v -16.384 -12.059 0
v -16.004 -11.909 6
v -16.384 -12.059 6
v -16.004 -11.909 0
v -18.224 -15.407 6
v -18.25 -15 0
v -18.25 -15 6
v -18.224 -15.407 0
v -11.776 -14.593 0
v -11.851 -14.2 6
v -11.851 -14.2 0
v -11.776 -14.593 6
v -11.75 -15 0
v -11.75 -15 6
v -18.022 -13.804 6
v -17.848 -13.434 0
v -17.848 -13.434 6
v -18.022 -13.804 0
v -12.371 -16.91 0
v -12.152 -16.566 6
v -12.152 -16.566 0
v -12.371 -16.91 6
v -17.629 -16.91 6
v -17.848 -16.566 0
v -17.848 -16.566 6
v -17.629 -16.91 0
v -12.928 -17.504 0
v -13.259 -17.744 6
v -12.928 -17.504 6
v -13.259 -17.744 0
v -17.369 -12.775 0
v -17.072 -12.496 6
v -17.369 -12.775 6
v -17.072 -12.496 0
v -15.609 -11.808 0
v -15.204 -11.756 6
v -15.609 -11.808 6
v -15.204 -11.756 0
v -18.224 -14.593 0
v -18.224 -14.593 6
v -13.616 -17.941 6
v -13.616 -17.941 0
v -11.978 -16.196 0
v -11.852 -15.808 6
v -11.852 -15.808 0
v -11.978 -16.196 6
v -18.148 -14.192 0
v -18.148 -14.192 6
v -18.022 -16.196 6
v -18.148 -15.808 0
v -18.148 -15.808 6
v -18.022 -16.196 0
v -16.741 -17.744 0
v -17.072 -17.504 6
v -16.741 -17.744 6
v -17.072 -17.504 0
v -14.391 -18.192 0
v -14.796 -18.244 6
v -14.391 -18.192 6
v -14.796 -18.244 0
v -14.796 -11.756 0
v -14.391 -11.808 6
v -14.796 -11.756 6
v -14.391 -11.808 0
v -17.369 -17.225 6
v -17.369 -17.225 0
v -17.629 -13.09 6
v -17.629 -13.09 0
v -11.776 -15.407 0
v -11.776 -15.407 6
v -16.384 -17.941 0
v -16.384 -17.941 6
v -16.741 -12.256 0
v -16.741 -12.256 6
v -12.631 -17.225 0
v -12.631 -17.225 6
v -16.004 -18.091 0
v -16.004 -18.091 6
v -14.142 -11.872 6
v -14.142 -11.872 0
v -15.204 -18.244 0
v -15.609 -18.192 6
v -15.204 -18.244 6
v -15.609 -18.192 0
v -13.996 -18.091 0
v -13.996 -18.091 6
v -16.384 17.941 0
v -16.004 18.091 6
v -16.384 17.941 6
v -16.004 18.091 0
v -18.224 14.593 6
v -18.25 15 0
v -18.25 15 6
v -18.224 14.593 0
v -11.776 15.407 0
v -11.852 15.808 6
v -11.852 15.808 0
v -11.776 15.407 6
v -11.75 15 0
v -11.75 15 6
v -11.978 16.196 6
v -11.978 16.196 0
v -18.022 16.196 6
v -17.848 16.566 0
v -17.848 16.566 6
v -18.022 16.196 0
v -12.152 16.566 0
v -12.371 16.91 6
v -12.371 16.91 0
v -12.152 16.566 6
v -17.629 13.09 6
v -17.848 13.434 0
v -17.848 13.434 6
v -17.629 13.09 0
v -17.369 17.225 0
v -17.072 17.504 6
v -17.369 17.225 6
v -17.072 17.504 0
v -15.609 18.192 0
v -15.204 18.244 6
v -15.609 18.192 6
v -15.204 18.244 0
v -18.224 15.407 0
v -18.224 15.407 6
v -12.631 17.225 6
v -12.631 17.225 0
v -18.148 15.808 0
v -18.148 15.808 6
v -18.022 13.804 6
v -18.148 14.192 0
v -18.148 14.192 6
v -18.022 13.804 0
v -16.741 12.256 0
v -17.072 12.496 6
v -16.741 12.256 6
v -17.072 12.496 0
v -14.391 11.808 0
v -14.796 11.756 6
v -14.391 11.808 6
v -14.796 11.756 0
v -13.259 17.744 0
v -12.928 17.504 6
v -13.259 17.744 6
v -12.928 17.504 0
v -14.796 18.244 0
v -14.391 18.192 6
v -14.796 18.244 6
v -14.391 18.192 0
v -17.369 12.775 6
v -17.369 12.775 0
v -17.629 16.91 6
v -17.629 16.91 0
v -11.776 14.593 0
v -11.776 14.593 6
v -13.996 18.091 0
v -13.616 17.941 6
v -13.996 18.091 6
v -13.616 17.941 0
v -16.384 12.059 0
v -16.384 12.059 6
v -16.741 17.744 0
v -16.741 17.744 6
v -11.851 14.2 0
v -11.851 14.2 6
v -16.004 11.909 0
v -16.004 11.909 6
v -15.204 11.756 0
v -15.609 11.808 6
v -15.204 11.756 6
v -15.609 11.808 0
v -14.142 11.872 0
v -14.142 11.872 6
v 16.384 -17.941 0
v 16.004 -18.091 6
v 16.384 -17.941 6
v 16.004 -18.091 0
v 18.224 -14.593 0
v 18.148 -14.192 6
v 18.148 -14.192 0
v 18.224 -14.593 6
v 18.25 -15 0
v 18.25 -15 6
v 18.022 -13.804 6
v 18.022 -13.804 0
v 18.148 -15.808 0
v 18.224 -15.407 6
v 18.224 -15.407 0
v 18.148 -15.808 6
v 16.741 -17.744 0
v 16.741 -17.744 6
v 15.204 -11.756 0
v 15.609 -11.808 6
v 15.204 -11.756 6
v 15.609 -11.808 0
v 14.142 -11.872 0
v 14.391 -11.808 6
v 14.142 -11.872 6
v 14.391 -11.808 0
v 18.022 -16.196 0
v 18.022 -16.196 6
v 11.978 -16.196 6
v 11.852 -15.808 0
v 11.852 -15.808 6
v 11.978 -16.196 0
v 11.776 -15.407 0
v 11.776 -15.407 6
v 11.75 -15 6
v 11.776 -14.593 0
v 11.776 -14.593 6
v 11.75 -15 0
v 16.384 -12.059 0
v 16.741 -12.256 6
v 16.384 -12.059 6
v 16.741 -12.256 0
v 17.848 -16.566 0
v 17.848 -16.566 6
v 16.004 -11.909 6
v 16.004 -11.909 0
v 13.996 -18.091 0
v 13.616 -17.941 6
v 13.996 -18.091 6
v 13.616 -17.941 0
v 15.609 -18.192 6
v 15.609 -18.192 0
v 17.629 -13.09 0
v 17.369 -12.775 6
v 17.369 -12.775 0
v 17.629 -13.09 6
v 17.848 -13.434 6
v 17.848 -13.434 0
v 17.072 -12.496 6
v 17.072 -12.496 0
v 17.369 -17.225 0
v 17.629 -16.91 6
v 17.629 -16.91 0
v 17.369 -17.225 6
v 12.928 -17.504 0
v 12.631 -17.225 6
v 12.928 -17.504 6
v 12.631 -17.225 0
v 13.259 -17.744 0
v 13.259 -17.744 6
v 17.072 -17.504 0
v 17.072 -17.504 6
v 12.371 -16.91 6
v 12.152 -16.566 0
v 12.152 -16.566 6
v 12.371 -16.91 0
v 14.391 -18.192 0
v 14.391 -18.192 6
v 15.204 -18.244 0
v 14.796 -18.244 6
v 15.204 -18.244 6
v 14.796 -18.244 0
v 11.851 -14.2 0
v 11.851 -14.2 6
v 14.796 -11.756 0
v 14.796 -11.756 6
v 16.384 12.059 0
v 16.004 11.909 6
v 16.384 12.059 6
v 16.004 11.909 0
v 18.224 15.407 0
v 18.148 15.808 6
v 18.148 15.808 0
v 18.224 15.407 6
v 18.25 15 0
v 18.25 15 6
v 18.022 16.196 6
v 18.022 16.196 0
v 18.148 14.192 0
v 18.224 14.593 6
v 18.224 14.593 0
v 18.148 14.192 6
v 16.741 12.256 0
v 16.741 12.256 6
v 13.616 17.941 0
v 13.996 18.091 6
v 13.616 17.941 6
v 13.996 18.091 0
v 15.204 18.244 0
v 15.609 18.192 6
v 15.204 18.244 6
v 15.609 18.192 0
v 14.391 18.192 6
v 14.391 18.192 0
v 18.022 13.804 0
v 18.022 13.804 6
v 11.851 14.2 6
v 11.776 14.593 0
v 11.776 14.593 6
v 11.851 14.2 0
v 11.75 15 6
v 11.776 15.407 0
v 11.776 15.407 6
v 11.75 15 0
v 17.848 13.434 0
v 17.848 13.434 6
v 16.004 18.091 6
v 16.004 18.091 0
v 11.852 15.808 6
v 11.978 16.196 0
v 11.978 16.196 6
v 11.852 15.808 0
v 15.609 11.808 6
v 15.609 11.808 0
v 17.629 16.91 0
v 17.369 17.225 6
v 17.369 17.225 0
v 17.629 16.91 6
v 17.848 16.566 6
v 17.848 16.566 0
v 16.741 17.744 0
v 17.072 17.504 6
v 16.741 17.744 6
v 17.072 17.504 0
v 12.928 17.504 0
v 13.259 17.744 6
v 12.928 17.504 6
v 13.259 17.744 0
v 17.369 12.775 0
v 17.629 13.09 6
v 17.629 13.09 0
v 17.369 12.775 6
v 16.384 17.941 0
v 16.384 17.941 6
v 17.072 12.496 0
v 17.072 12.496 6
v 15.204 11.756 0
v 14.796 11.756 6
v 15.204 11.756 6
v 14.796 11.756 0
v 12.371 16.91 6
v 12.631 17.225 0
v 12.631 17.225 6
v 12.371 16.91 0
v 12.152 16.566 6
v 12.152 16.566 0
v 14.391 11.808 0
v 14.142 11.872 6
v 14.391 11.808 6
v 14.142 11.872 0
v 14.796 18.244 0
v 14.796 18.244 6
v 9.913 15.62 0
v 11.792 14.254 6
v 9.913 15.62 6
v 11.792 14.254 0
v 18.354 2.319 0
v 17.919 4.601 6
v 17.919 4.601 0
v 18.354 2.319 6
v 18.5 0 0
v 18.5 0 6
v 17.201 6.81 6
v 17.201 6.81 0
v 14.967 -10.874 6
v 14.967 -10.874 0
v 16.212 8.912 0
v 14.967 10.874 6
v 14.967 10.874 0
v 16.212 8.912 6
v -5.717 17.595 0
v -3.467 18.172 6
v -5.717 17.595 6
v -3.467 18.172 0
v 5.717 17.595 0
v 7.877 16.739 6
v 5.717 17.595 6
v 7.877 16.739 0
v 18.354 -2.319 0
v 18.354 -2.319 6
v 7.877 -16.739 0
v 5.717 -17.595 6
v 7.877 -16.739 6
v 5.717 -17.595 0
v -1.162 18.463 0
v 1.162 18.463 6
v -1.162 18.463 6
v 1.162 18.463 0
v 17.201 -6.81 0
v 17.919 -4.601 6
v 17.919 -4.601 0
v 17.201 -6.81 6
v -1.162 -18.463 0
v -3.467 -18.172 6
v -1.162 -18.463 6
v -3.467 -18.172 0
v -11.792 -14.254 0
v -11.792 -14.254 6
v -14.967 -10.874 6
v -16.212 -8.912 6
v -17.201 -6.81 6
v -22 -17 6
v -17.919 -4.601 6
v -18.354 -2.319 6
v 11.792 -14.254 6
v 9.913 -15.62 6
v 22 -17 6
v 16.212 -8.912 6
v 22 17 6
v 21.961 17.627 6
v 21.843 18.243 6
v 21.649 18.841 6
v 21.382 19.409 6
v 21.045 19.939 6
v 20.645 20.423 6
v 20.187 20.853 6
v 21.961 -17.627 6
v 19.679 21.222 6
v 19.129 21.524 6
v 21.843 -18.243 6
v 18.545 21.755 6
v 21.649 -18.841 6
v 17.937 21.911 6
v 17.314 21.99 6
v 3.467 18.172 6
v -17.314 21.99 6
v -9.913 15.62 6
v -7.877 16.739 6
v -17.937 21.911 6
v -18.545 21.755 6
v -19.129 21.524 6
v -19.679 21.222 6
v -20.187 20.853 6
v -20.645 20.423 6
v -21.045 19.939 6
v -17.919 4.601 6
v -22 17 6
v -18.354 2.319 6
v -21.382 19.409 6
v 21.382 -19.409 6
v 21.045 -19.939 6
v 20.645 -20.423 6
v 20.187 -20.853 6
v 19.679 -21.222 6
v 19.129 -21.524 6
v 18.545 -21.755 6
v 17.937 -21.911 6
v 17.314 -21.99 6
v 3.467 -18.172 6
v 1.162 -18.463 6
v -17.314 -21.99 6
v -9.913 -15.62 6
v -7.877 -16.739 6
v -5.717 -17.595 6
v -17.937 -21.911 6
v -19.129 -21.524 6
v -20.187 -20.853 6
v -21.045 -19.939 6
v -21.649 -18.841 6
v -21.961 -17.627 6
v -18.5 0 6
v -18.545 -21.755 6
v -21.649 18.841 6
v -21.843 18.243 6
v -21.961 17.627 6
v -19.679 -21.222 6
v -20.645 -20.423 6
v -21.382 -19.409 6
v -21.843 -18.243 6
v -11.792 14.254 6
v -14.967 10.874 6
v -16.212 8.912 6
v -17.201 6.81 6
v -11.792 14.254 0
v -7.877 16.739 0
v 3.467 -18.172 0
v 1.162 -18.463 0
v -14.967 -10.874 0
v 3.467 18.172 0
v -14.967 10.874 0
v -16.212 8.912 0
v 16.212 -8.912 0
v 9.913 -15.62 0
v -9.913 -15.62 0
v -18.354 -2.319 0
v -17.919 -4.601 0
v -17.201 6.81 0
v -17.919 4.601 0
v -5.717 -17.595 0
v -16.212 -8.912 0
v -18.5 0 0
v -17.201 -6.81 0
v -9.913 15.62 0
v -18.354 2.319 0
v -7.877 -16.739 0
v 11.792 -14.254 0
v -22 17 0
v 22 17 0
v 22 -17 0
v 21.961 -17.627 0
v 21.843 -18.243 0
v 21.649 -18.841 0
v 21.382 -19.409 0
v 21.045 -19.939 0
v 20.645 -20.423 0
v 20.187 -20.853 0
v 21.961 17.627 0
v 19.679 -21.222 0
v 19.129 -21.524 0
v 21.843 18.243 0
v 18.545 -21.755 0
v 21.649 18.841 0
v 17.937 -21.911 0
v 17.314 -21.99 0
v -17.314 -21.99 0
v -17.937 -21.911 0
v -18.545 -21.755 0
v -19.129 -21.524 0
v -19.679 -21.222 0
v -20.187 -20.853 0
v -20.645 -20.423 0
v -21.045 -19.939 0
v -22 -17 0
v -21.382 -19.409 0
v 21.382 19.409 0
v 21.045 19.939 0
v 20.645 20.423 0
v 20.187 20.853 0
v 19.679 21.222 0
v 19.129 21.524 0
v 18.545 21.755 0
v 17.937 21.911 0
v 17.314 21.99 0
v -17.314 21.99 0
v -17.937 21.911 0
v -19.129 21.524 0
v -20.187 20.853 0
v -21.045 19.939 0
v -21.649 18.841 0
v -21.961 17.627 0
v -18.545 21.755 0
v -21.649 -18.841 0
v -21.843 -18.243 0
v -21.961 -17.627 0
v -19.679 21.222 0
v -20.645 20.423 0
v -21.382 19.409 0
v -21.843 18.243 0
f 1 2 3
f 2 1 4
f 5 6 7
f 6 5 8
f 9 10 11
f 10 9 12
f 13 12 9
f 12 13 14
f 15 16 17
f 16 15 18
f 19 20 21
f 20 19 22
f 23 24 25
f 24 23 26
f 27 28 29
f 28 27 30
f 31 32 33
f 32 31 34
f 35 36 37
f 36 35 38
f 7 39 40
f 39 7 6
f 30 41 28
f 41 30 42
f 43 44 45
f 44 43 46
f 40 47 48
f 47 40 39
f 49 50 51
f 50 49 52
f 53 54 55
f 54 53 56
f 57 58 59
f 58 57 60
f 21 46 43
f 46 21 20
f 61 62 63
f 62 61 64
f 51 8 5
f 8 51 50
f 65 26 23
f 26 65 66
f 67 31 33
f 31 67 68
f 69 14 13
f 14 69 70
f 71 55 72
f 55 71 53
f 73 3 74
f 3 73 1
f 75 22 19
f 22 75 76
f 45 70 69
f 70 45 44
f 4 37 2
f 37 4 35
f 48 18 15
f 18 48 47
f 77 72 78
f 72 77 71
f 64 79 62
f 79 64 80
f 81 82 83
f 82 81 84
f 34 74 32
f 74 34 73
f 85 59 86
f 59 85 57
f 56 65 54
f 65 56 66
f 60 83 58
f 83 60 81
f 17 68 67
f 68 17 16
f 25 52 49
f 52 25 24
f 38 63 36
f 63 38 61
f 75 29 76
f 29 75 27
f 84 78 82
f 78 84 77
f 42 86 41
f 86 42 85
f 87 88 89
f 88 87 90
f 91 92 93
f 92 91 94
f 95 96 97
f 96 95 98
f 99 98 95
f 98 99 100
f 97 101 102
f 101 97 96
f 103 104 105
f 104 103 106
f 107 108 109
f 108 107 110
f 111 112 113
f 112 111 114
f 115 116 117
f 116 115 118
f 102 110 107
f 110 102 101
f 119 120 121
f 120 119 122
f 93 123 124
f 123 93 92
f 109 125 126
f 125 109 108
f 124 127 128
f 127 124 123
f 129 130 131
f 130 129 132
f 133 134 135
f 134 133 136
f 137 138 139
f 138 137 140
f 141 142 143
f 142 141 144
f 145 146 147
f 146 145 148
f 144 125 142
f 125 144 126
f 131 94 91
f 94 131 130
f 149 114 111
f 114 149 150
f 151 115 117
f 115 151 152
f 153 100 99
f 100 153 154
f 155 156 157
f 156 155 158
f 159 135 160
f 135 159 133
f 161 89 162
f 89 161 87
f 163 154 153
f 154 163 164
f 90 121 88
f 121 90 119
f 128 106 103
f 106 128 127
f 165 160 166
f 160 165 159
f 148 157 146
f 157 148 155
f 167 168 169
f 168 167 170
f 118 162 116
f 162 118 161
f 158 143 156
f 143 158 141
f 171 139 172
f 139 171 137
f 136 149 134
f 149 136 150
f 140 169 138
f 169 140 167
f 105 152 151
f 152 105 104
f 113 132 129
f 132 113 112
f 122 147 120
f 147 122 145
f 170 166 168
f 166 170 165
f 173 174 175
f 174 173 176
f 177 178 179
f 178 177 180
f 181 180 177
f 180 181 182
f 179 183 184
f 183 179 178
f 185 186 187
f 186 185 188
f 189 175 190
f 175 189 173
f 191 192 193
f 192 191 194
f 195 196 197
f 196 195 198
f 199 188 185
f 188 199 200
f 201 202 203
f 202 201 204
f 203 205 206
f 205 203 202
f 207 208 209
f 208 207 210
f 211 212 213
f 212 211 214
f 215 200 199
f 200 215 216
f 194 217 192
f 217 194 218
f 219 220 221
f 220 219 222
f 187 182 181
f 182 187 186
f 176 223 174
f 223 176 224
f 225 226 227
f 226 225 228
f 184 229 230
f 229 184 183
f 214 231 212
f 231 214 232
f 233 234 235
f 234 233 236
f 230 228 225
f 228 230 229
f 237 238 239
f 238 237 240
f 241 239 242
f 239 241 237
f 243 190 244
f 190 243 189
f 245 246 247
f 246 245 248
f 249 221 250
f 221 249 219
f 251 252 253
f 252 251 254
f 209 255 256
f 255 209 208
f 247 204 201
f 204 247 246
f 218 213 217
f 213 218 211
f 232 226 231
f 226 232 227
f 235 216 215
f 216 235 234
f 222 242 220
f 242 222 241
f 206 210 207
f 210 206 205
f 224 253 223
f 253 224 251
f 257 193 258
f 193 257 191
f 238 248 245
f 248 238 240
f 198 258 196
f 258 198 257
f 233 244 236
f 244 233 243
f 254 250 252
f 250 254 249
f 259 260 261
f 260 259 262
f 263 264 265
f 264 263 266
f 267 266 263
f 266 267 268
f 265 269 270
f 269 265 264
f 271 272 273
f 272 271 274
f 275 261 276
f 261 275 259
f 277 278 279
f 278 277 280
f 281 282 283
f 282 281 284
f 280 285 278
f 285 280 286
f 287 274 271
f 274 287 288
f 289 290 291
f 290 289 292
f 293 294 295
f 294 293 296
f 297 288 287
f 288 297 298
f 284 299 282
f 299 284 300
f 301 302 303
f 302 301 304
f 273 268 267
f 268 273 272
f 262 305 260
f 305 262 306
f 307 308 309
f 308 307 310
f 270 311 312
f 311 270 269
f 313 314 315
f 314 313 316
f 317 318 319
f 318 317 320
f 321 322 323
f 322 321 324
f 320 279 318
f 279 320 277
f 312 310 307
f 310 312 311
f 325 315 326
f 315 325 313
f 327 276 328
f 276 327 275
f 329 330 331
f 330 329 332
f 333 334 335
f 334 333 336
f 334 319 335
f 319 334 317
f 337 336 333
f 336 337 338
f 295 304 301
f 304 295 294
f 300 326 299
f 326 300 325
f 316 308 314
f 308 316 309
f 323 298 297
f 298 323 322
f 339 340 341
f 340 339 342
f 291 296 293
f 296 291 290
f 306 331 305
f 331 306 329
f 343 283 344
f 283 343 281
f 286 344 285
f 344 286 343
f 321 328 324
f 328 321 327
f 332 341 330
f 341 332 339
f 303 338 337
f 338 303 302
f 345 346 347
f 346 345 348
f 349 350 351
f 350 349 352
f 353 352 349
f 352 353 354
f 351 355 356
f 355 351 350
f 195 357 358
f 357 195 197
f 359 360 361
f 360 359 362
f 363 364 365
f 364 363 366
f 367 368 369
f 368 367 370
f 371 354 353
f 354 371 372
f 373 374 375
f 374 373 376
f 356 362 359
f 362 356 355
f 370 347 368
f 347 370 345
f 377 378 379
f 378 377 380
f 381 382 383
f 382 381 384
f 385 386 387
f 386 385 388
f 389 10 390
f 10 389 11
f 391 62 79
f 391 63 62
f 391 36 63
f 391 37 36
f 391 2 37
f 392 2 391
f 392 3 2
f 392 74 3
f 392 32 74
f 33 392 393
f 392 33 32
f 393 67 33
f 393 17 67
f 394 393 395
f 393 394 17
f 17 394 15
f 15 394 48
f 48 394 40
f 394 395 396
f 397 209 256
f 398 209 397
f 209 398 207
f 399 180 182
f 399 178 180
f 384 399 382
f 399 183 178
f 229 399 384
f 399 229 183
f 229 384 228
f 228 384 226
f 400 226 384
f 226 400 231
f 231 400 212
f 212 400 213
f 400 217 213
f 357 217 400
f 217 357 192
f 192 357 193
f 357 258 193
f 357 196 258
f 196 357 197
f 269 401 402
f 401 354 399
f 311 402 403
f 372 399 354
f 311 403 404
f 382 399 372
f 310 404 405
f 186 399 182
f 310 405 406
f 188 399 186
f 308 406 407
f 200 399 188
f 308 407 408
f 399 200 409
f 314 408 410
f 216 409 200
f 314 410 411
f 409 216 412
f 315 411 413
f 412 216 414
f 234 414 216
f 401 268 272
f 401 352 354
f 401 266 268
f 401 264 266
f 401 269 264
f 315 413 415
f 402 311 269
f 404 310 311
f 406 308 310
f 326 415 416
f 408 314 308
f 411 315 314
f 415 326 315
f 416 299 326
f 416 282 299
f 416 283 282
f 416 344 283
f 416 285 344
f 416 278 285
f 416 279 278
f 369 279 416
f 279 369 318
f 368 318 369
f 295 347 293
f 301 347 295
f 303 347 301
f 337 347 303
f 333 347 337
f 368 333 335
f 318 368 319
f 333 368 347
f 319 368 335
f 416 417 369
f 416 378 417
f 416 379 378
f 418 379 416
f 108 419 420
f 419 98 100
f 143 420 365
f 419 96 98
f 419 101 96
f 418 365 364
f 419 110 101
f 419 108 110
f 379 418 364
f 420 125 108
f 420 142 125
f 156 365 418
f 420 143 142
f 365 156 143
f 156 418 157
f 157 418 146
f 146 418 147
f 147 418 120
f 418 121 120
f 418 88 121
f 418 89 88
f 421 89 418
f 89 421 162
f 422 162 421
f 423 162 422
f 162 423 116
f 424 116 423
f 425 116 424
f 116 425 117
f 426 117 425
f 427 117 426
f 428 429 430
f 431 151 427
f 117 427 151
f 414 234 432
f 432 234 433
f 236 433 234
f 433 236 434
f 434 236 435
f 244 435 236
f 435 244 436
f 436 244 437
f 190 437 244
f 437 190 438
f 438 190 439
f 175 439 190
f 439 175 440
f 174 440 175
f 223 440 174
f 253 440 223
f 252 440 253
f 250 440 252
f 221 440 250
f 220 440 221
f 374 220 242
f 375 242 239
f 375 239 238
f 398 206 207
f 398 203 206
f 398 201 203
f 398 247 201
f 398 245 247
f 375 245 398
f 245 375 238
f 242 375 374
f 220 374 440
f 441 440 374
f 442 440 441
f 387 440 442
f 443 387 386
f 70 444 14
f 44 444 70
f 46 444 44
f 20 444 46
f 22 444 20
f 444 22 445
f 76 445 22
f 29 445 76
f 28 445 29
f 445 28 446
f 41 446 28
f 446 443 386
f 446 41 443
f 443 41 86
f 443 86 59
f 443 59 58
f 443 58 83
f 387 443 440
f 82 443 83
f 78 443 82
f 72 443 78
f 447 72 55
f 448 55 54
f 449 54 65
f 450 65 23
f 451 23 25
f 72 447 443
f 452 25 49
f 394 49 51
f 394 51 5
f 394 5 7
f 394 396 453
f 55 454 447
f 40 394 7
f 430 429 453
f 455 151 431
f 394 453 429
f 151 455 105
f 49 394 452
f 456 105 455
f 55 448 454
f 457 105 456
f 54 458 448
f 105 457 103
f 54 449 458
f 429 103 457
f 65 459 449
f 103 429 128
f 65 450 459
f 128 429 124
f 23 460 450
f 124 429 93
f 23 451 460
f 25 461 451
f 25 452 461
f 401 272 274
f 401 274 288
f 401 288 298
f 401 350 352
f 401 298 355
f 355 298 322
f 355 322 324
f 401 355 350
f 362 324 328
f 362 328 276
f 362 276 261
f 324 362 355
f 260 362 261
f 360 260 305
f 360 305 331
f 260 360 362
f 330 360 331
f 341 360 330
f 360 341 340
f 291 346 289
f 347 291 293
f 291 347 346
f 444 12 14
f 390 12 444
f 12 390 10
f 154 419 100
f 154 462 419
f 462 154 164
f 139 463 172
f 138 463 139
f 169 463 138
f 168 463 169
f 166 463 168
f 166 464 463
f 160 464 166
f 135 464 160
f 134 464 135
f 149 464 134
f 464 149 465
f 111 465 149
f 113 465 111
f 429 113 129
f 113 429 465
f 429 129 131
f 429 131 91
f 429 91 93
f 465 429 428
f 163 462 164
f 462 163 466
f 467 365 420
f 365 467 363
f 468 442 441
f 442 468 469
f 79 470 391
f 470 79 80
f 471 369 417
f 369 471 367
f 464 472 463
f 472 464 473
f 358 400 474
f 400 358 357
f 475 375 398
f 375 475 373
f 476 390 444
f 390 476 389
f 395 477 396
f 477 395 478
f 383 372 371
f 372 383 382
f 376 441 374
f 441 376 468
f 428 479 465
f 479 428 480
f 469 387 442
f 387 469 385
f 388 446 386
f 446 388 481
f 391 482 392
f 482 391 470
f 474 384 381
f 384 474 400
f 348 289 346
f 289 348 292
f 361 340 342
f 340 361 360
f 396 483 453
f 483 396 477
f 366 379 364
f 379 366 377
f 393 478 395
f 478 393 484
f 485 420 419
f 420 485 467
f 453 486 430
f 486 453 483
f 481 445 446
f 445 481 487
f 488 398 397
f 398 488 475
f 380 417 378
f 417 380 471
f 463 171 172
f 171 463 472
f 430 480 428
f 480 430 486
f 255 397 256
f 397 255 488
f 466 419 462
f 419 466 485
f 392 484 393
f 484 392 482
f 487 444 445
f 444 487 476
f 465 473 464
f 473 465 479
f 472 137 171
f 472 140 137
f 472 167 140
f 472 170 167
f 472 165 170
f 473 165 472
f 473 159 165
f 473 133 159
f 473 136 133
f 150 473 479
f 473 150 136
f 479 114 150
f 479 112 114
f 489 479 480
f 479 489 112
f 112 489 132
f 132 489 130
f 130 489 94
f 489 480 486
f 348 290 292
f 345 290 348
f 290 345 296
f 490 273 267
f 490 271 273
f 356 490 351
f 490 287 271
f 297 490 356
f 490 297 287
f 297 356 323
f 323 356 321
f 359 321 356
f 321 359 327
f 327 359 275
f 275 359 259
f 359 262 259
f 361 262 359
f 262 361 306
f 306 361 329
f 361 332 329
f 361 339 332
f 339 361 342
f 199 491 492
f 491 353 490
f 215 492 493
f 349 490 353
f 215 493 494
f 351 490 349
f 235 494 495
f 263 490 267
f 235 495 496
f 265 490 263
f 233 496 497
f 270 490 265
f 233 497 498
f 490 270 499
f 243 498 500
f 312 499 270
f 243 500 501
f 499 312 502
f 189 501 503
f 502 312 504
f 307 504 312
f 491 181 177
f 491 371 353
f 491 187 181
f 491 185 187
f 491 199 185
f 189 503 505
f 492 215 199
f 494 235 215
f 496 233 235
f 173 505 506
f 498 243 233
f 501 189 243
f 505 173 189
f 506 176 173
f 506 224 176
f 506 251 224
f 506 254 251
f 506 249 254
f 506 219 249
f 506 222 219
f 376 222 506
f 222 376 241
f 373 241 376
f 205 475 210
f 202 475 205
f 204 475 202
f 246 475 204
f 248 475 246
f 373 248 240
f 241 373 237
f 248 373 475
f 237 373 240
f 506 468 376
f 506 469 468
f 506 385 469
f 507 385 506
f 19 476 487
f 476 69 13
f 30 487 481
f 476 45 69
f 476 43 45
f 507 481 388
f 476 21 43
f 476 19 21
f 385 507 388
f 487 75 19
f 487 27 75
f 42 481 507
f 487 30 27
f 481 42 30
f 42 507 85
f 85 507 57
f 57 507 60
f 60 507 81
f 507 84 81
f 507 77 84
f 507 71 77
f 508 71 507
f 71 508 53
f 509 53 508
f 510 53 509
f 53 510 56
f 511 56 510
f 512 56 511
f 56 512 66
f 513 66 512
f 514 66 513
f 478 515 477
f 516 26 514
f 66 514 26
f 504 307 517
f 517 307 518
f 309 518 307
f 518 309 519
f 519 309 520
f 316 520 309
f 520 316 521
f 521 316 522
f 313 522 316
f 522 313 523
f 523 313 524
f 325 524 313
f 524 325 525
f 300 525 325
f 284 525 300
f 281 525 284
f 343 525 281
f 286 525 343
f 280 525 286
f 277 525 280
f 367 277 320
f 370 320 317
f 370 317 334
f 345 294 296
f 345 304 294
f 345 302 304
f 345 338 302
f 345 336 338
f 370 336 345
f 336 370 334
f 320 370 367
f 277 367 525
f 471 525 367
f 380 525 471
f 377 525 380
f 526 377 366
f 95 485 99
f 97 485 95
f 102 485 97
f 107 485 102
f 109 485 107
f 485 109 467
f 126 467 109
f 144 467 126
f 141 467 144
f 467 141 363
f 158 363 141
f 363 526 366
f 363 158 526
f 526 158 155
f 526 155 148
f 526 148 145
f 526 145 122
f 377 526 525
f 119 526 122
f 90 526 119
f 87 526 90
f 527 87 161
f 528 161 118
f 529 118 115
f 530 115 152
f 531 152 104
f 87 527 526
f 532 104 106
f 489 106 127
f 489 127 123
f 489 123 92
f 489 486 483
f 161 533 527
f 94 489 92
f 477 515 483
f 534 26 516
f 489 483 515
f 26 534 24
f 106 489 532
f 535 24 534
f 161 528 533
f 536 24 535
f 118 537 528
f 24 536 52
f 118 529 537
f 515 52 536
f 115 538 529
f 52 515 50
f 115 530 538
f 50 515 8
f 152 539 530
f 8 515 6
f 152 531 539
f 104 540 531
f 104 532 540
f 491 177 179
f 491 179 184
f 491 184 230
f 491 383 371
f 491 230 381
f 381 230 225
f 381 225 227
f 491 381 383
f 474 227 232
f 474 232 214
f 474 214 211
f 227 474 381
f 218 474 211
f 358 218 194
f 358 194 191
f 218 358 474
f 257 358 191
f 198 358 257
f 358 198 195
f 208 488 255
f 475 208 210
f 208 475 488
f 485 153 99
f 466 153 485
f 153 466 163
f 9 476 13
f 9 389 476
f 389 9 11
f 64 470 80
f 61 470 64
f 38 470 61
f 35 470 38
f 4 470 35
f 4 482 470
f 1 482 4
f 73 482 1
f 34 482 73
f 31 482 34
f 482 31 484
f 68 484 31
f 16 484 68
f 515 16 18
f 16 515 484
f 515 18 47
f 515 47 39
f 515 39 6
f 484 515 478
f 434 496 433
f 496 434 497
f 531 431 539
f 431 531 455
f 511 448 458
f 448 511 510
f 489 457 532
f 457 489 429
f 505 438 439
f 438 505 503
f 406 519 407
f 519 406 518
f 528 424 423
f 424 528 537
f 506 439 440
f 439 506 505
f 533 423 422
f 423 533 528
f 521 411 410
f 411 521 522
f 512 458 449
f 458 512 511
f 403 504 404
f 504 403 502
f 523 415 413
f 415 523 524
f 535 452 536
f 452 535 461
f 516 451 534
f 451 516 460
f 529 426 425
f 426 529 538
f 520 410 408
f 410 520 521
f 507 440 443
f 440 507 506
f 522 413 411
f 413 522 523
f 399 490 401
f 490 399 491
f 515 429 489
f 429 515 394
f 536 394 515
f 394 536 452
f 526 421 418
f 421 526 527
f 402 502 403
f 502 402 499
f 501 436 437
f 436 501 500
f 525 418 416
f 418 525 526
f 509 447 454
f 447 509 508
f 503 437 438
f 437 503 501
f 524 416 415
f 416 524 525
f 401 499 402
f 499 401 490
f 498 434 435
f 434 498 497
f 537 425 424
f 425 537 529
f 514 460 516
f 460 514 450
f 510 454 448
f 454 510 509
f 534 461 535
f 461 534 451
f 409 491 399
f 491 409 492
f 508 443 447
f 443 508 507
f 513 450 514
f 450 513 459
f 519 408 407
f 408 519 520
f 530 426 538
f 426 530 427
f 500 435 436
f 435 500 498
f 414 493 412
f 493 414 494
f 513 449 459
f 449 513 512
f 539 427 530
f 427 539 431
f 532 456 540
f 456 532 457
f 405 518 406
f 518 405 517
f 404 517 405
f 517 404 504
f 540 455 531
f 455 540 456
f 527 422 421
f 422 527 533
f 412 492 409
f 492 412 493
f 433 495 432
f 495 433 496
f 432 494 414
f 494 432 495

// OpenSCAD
$fn = 50;

difference() {
	union() {
		hull() {
			translate(v = [-17.0, 17.0, 0]) {
				cylinder(h = 6, r = 5);
			}
			translate(v = [17.0, 17.0, 0]) {
				cylinder(h = 6, r = 5);
			}
			translate(v = [-17.0, -17.0, 0]) {
				cylinder(h = 6, r = 5);
			}
			translate(v = [17.0, -17.0, 0]) {
				cylinder(h = 6, r = 5);
			}
		}
	}
	union() {
		translate(v = [-15.0, -15.0, -100.0]) {
			cylinder(h = 200, r = 3.25);
		}
		translate(v = [-15.0, 15.0, -100.0]) {
			cylinder(h = 200, r = 3.25);
		}
		translate(v = [15.0, -15.0, -100.0]) {
			cylinder(h = 200, r = 3.25);
		}
		translate(v = [15.0, 15.0, -100.0]) {
			cylinder(h = 200, r = 3.25);
		}
		translate(v = [-15.0, -15.0, -100.0]) {
			cylinder(h = 200, r = 1.8);
		}
		translate(v = [-15.0, 15.0, -100.0]) {
			cylinder(h = 200, r = 1.8);
		}
		translate(v = [15.0, -15.0, -100.0]) {
			cylinder(h = 200, r = 1.8);
		}
		translate(v = [15.0, 15.0, -100.0]) {
			cylinder(h = 200, r = 1.8);
		}
		cylinder(h = 6, r = 18.5);
	}
}
